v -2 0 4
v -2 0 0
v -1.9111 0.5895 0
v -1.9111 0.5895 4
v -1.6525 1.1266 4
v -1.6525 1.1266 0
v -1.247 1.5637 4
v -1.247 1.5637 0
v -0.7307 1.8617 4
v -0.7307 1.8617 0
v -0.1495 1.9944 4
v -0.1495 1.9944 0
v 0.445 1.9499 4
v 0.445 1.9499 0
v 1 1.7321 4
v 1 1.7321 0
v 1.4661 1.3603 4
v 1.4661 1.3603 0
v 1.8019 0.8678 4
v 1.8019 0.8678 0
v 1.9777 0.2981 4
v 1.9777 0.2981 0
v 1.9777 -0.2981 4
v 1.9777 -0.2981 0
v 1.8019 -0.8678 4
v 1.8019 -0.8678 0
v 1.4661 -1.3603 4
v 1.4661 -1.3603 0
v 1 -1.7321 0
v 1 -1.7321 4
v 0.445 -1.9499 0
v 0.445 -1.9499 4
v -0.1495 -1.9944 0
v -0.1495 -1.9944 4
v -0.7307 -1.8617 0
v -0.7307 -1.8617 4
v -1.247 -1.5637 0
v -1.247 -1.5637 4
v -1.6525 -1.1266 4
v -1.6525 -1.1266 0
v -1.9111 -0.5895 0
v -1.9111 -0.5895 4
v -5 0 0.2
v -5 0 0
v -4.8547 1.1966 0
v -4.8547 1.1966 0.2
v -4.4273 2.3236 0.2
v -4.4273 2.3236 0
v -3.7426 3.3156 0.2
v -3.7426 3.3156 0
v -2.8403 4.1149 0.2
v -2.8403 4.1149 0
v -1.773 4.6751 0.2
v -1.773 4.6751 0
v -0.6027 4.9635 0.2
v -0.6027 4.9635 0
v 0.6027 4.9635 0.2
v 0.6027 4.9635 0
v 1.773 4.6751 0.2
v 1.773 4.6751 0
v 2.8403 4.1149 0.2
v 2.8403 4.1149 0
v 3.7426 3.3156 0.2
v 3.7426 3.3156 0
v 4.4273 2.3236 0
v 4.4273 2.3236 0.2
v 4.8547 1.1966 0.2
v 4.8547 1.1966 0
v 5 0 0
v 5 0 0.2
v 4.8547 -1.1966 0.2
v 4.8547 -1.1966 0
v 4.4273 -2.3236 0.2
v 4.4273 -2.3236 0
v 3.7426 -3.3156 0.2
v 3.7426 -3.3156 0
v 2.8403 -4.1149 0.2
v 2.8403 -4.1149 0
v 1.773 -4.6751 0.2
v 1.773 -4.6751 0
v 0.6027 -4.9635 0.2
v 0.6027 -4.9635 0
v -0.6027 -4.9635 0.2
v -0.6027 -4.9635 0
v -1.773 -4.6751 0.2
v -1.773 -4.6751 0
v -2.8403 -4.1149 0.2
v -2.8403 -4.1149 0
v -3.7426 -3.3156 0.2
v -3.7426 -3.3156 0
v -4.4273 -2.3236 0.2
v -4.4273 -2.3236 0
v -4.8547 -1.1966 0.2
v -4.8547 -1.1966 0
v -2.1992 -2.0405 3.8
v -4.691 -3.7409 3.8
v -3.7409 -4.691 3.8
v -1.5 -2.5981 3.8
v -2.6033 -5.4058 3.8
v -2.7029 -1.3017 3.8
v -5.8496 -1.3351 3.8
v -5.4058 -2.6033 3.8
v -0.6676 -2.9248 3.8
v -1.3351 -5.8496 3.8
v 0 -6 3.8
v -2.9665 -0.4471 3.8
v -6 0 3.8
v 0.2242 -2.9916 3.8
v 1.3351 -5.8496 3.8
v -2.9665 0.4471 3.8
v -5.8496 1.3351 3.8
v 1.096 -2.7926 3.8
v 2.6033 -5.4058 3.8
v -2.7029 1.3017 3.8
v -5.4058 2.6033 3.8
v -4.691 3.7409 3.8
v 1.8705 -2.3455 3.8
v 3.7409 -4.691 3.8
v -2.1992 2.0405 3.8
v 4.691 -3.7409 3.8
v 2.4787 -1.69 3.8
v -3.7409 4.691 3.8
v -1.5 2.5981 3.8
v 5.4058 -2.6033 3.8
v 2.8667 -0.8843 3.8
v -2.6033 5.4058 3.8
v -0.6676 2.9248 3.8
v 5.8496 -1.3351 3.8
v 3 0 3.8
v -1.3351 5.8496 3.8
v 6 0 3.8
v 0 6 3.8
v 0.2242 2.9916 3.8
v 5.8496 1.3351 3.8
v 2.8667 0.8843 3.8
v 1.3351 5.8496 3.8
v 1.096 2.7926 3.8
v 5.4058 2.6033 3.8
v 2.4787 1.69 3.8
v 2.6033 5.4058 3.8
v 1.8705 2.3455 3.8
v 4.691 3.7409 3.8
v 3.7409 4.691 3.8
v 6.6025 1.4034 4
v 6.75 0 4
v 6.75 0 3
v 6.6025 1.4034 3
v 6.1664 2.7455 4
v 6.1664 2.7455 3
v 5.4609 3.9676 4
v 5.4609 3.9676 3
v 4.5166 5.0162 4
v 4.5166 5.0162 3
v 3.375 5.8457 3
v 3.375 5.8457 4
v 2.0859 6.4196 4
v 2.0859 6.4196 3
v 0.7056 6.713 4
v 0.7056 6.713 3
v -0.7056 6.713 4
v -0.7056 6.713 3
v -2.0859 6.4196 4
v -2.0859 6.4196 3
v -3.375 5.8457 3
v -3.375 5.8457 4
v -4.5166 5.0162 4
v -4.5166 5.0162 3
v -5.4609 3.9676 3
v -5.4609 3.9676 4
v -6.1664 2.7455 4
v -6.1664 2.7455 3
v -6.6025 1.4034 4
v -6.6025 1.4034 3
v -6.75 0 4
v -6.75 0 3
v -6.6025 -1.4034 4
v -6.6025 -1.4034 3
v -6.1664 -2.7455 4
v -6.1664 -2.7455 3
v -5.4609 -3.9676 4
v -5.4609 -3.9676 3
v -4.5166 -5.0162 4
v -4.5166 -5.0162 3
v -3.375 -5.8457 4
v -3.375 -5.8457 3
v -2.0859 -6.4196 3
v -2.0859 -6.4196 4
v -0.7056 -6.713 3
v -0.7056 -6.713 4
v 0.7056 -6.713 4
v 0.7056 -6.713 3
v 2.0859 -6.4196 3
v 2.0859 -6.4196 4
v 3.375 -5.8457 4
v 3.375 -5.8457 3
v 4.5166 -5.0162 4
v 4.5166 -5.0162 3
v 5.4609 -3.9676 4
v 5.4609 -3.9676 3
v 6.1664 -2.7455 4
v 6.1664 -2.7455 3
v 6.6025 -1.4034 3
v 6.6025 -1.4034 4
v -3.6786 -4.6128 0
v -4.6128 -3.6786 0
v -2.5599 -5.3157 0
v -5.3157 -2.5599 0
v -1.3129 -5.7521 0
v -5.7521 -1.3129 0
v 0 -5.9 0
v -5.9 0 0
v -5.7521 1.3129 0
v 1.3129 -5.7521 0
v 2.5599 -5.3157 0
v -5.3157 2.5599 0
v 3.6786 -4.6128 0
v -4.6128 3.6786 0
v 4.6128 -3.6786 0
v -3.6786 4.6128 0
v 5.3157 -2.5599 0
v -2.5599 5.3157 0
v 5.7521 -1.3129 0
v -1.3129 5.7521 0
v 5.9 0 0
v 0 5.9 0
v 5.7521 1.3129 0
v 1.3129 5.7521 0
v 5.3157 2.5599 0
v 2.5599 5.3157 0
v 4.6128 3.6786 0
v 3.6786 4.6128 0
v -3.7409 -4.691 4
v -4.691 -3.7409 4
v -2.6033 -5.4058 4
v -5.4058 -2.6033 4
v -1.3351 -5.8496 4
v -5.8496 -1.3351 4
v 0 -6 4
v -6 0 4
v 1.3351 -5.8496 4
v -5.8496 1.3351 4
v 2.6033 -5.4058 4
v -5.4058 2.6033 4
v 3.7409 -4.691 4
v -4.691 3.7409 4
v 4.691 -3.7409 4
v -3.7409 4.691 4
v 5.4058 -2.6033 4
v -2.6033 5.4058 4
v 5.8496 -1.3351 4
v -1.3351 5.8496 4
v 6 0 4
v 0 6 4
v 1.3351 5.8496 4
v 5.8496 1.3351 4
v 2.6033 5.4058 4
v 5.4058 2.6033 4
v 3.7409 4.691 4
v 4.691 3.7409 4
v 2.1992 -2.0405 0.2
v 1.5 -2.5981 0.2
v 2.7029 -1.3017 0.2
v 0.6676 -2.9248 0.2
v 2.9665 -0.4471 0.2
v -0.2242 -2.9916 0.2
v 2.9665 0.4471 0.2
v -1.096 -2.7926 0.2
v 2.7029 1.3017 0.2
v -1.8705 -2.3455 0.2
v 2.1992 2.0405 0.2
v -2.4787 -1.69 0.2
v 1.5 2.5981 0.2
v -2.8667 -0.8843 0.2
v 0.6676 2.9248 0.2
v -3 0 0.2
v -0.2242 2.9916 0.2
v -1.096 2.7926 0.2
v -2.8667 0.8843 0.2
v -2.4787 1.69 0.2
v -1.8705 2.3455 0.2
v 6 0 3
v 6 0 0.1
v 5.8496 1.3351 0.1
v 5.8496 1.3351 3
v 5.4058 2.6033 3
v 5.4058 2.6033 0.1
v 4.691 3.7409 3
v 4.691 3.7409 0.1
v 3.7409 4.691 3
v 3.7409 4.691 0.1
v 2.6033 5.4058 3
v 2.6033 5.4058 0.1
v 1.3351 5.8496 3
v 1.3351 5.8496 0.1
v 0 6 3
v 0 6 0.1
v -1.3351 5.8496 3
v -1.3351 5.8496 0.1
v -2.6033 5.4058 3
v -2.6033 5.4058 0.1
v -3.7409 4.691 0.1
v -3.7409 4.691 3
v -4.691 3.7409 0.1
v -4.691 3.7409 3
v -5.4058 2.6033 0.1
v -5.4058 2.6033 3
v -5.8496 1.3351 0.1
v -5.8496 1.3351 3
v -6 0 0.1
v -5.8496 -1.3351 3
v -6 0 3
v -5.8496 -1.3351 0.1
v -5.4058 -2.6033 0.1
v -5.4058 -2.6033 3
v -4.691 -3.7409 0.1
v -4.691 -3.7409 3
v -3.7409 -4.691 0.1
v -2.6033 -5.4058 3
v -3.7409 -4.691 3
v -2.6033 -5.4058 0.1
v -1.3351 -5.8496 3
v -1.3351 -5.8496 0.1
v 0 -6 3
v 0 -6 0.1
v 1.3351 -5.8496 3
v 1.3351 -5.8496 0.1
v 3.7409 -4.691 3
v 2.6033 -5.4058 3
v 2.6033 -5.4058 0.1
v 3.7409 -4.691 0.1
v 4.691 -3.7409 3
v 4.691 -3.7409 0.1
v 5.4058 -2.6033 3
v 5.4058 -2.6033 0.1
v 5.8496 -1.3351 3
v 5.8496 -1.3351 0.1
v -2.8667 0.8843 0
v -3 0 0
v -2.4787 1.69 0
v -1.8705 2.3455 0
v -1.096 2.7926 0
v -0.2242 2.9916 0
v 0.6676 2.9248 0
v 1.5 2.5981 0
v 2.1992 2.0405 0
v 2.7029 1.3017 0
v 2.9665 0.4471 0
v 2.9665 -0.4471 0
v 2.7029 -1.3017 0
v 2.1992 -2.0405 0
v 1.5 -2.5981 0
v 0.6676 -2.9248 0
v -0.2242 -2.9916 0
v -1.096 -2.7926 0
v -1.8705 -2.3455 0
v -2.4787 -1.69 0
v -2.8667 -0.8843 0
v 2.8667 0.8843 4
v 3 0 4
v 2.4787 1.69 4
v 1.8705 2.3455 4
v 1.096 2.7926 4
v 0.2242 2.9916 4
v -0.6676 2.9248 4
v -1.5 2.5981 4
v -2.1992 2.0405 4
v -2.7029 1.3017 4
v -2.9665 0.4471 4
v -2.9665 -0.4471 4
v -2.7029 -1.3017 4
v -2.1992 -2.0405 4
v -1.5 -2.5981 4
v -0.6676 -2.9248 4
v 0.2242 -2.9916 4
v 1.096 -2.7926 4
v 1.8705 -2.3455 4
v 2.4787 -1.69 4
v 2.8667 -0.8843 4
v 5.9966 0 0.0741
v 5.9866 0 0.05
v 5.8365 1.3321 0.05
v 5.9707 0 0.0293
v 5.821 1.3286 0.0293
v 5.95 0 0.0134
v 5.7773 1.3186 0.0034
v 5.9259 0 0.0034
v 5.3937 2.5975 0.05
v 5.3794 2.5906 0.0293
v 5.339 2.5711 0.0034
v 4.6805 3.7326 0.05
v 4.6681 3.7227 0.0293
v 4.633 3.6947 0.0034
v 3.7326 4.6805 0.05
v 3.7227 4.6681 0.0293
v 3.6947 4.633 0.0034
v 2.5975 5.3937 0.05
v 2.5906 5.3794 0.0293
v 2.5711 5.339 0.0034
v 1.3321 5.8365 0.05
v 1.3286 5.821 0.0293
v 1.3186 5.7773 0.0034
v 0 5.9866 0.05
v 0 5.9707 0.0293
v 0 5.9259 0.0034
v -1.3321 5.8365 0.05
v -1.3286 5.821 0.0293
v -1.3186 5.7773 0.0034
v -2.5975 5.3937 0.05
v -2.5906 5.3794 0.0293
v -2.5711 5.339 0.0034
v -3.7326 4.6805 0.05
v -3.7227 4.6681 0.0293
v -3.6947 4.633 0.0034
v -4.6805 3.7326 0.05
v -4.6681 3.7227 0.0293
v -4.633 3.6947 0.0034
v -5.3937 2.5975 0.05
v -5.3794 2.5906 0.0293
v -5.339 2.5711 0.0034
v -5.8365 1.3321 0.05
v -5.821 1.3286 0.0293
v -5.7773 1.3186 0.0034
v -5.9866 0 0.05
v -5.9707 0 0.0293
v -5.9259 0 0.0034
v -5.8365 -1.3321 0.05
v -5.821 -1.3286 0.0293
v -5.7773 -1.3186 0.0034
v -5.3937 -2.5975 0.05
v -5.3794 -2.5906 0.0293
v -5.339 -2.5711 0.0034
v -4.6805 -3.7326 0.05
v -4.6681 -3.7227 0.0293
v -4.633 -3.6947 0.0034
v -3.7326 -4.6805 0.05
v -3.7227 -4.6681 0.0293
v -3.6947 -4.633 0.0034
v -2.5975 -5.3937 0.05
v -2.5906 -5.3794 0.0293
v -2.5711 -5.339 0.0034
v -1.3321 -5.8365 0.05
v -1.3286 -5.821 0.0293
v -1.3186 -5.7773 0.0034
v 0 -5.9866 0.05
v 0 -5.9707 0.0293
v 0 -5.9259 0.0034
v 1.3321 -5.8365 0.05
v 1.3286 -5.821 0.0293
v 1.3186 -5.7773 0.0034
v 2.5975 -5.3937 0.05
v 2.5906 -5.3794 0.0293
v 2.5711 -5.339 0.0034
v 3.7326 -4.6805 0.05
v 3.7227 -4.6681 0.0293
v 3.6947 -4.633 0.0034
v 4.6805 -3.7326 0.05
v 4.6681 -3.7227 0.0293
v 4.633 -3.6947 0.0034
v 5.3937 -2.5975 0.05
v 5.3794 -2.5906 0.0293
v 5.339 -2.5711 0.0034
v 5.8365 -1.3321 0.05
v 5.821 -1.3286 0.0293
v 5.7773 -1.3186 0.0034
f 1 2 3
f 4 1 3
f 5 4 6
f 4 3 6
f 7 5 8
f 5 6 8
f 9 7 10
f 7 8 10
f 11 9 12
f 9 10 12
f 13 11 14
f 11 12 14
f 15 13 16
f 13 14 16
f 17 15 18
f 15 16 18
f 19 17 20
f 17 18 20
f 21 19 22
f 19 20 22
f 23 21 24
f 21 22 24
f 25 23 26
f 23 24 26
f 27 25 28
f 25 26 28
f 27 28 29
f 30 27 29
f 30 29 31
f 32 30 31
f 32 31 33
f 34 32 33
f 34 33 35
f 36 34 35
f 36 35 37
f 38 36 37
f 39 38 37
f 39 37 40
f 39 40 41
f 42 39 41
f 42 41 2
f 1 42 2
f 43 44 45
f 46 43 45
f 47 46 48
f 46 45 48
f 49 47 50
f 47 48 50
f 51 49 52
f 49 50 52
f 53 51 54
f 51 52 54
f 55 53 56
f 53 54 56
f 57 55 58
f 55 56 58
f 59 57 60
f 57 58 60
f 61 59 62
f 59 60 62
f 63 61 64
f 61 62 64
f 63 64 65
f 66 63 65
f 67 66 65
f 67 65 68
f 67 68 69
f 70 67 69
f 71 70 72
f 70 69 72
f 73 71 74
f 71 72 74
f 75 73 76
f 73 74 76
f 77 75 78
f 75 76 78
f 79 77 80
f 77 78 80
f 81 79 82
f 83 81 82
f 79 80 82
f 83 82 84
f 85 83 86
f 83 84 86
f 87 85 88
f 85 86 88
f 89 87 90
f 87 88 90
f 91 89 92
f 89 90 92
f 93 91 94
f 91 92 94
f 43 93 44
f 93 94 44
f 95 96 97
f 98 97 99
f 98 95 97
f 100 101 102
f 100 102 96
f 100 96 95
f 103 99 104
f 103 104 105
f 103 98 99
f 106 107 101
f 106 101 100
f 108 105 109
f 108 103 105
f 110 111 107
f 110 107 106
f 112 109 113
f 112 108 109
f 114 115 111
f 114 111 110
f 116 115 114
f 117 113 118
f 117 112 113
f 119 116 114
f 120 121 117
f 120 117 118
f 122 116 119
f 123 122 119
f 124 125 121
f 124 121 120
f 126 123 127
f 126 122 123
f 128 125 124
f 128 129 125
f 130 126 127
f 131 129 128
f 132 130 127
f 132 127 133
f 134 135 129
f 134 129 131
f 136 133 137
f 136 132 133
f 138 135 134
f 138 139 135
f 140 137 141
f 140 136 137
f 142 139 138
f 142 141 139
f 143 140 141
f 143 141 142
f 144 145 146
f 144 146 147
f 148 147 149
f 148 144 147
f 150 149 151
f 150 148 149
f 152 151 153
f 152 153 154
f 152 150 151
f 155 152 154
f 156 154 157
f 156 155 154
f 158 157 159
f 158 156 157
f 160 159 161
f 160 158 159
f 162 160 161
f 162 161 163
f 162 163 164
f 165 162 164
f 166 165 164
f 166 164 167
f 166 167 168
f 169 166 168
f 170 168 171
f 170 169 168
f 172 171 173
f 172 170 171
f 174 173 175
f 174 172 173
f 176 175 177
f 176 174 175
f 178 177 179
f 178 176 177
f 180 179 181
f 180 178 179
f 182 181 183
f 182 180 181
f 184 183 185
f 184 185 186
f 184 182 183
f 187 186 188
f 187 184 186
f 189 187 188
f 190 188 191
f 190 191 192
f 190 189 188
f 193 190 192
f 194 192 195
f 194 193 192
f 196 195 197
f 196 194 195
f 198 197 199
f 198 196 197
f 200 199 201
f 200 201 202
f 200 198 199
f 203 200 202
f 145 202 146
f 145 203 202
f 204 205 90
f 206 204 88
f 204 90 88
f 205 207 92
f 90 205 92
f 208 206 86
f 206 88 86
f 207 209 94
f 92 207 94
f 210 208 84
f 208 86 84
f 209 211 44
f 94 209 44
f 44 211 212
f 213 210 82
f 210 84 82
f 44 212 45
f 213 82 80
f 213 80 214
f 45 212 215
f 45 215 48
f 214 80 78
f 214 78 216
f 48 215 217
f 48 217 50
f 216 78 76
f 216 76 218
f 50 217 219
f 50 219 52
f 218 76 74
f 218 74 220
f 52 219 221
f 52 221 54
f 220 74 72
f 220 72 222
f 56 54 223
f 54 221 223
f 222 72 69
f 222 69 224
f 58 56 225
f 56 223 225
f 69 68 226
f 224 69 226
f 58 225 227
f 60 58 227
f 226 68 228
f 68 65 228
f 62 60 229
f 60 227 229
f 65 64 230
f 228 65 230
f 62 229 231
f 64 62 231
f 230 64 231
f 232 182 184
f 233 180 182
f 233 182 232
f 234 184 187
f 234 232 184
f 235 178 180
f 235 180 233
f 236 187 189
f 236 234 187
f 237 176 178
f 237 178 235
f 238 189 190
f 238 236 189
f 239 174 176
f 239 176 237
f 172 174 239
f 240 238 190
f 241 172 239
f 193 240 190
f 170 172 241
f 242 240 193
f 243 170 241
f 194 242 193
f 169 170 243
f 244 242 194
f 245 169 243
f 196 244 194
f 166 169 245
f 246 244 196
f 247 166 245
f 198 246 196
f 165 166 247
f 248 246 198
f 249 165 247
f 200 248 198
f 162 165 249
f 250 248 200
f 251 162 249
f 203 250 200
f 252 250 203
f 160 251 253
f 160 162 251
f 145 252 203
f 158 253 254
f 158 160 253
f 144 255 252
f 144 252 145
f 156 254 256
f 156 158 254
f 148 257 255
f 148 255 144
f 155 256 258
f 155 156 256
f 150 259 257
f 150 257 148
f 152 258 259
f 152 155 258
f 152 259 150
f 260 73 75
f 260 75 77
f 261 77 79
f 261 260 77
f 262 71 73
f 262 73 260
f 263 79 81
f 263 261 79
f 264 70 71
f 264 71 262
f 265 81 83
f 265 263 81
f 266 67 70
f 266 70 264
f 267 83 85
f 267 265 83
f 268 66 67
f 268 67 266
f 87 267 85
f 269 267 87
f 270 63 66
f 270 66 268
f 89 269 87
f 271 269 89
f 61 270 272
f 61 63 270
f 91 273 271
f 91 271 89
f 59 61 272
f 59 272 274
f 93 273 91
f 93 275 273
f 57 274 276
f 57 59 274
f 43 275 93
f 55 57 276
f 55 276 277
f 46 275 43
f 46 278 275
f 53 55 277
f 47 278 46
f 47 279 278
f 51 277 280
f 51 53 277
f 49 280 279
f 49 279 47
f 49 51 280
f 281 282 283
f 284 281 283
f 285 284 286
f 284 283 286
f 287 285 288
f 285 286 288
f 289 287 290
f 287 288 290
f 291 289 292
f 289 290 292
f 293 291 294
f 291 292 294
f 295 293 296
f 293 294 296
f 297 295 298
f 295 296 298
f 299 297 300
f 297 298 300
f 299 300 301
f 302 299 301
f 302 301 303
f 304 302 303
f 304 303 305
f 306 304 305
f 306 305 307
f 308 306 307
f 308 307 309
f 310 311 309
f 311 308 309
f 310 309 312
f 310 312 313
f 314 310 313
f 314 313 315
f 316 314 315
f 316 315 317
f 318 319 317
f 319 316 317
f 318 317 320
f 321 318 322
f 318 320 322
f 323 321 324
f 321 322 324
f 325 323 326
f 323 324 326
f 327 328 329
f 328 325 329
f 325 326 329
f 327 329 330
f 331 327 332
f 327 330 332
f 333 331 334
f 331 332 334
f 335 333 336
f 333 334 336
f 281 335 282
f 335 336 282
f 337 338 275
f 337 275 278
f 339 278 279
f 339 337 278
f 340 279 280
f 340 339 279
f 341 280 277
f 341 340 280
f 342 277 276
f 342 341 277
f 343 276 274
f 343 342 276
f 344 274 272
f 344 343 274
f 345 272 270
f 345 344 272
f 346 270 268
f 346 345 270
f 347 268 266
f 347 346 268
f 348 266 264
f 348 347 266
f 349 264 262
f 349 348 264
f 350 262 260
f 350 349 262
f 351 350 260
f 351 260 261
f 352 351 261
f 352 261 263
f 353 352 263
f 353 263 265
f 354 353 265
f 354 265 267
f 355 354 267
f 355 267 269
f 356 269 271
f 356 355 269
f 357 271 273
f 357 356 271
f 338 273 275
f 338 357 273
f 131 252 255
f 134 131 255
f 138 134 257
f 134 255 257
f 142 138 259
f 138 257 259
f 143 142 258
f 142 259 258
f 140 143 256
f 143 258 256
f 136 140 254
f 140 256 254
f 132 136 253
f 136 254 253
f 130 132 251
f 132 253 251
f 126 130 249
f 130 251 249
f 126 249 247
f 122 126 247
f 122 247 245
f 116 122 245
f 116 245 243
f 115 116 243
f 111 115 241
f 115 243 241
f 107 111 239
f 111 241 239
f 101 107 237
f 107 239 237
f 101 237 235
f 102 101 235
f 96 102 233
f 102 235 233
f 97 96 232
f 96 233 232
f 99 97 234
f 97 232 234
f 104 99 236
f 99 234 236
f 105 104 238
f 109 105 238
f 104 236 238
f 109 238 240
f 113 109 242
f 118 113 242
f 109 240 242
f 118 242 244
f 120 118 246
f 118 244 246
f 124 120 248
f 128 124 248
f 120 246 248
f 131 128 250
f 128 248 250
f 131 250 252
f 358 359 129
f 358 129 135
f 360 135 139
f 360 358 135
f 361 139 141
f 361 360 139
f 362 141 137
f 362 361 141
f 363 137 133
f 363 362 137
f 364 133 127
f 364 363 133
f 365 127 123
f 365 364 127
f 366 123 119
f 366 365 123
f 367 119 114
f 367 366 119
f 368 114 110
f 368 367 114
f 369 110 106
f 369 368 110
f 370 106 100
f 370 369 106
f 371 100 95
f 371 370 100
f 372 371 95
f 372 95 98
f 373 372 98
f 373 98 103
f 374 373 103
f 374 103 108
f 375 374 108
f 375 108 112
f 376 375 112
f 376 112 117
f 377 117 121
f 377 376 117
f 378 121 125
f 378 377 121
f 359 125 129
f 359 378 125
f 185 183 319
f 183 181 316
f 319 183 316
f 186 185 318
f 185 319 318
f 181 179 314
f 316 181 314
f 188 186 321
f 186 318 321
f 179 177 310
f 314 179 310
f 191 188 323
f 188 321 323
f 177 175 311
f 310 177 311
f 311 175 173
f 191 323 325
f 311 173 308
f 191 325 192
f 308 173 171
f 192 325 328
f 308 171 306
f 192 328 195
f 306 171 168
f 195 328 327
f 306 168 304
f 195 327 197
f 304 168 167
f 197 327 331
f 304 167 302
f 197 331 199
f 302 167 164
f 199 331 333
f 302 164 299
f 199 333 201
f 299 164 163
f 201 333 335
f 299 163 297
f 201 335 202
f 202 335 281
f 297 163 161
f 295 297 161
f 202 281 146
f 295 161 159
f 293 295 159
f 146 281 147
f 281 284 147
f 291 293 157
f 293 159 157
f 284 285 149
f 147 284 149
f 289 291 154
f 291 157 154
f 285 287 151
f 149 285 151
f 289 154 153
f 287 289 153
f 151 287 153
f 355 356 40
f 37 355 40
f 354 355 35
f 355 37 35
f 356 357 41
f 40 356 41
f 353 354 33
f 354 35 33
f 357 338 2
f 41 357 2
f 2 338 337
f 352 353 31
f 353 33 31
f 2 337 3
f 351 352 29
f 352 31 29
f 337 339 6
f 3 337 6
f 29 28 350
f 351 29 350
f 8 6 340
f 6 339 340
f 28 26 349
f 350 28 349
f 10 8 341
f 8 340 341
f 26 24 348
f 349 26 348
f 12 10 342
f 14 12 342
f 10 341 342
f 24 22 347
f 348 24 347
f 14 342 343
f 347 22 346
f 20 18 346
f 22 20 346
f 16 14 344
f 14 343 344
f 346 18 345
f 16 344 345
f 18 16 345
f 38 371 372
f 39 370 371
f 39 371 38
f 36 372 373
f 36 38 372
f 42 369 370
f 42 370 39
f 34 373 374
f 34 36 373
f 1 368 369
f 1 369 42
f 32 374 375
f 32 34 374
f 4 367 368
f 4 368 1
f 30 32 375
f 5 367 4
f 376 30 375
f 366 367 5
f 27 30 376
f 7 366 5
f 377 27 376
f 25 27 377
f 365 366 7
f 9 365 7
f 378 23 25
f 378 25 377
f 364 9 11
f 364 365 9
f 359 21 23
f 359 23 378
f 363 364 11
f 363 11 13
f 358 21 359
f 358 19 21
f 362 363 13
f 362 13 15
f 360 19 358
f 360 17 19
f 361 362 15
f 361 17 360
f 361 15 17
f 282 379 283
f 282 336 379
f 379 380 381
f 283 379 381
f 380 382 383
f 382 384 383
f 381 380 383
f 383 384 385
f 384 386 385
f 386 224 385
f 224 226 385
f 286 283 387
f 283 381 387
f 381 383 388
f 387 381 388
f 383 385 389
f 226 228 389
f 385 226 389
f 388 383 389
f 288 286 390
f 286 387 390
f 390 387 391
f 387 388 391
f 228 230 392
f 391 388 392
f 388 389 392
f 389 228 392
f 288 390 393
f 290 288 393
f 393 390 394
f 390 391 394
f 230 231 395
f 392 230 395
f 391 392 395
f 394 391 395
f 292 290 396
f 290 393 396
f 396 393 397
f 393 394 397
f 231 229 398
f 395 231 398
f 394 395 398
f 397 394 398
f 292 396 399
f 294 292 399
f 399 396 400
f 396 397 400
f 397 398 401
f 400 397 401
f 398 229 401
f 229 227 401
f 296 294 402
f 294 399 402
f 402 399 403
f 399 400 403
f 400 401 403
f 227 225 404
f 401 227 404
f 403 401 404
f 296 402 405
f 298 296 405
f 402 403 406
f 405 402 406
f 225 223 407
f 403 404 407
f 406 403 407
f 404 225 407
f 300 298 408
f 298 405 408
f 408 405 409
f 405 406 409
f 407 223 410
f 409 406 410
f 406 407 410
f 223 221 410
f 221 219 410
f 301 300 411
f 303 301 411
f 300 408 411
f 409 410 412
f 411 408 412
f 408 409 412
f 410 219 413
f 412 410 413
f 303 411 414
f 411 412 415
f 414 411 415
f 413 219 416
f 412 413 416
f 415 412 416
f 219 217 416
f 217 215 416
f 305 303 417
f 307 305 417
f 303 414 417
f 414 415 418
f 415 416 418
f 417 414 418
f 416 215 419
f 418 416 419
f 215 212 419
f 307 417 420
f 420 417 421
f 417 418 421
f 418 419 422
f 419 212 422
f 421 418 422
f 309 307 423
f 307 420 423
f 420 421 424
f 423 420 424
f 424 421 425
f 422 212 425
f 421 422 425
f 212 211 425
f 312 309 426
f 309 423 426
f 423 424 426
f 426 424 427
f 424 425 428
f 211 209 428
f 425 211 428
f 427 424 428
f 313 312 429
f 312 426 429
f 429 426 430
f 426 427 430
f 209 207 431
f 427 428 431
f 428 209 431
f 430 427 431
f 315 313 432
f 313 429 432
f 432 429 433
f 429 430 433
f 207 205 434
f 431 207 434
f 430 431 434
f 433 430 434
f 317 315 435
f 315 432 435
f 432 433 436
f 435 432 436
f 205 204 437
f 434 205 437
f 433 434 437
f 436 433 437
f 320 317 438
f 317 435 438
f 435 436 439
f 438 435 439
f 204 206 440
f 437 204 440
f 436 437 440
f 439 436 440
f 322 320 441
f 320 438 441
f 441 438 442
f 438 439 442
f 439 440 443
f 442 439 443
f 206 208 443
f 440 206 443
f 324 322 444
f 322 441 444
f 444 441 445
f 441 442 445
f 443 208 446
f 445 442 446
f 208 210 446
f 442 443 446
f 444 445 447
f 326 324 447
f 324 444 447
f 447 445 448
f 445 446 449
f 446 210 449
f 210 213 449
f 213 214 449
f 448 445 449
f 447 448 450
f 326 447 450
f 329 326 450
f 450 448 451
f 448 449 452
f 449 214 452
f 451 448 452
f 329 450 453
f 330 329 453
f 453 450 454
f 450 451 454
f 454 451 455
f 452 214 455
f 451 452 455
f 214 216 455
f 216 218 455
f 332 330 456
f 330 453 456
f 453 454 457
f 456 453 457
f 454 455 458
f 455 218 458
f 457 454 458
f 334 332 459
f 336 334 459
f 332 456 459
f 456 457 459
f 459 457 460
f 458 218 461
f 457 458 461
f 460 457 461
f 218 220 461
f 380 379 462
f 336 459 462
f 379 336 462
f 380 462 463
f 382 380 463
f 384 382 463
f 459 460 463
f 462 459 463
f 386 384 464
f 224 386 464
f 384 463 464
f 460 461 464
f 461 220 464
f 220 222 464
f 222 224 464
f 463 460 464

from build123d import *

# Parameters (mm, degrees)
SKETCH_1_R          = 6
EXTRUDE_1_DEPTH     = 4
SKETCH_2_R          = 6.75
EXTRUDE_2_DEPTH     = 1
SKETCH_3_R          = 2
CUT_EXTRUDE_1_DEPTH = 5
SKETCH_4_R          = 5
SKETCH_4_R_2        = 3
CUT_EXTRUDE_2_DEPTH = 0.2
SKETCH_5_R          = 6
SKETCH_5_R_2        = 3
CUT_EXTRUDE_3_DEPTH = 0.2
FILLET_1_R          = 0.1


with BuildPart() as part:
    # 草圖1 → 填料-伸長1 (new body)
    with BuildSketch(Plane.XY):
        Circle(SKETCH_1_R)
    extrude(amount=EXTRUDE_1_DEPTH)

    # 草圖2 → 填料-伸長2 (add)
    with BuildSketch(Plane.XY.offset(4)):
        Circle(SKETCH_2_R)
    extrude(amount=-EXTRUDE_2_DEPTH)

    # 草圖3 → 除料-伸長1 (cut, through all)
    with BuildSketch(Plane(origin=(0, 0, 0), x_dir=(-1, 0, 0), z_dir=(0, 0, -1))):
        Circle(SKETCH_3_R)
    extrude(amount=-CUT_EXTRUDE_1_DEPTH, mode=Mode.SUBTRACT)

    # 草圖4 → 除料-伸長2 (cut)
    with BuildSketch(Plane(origin=(0, 0, 0), x_dir=(-1, 0, 0), z_dir=(0, 0, -1))):
        Circle(SKETCH_4_R)
        Circle(SKETCH_4_R_2, mode=Mode.SUBTRACT)
    extrude(amount=-CUT_EXTRUDE_2_DEPTH, mode=Mode.SUBTRACT)

    # 草圖5 → 除料-伸長3 (cut)
    with BuildSketch(Plane.XY.offset(4)):
        Circle(SKETCH_5_R)
        Circle(SKETCH_5_R_2, mode=Mode.SUBTRACT)
    extrude(amount=-CUT_EXTRUDE_3_DEPTH, mode=Mode.SUBTRACT)

    # 圓角1
    fillet_1_edges = [part.edges().sort_by_distance(p)[0] for p in [
        (-6, 0, 0),
    ]]
    fillet(fillet_1_edges, radius=FILLET_1_R)


solid = part.part
